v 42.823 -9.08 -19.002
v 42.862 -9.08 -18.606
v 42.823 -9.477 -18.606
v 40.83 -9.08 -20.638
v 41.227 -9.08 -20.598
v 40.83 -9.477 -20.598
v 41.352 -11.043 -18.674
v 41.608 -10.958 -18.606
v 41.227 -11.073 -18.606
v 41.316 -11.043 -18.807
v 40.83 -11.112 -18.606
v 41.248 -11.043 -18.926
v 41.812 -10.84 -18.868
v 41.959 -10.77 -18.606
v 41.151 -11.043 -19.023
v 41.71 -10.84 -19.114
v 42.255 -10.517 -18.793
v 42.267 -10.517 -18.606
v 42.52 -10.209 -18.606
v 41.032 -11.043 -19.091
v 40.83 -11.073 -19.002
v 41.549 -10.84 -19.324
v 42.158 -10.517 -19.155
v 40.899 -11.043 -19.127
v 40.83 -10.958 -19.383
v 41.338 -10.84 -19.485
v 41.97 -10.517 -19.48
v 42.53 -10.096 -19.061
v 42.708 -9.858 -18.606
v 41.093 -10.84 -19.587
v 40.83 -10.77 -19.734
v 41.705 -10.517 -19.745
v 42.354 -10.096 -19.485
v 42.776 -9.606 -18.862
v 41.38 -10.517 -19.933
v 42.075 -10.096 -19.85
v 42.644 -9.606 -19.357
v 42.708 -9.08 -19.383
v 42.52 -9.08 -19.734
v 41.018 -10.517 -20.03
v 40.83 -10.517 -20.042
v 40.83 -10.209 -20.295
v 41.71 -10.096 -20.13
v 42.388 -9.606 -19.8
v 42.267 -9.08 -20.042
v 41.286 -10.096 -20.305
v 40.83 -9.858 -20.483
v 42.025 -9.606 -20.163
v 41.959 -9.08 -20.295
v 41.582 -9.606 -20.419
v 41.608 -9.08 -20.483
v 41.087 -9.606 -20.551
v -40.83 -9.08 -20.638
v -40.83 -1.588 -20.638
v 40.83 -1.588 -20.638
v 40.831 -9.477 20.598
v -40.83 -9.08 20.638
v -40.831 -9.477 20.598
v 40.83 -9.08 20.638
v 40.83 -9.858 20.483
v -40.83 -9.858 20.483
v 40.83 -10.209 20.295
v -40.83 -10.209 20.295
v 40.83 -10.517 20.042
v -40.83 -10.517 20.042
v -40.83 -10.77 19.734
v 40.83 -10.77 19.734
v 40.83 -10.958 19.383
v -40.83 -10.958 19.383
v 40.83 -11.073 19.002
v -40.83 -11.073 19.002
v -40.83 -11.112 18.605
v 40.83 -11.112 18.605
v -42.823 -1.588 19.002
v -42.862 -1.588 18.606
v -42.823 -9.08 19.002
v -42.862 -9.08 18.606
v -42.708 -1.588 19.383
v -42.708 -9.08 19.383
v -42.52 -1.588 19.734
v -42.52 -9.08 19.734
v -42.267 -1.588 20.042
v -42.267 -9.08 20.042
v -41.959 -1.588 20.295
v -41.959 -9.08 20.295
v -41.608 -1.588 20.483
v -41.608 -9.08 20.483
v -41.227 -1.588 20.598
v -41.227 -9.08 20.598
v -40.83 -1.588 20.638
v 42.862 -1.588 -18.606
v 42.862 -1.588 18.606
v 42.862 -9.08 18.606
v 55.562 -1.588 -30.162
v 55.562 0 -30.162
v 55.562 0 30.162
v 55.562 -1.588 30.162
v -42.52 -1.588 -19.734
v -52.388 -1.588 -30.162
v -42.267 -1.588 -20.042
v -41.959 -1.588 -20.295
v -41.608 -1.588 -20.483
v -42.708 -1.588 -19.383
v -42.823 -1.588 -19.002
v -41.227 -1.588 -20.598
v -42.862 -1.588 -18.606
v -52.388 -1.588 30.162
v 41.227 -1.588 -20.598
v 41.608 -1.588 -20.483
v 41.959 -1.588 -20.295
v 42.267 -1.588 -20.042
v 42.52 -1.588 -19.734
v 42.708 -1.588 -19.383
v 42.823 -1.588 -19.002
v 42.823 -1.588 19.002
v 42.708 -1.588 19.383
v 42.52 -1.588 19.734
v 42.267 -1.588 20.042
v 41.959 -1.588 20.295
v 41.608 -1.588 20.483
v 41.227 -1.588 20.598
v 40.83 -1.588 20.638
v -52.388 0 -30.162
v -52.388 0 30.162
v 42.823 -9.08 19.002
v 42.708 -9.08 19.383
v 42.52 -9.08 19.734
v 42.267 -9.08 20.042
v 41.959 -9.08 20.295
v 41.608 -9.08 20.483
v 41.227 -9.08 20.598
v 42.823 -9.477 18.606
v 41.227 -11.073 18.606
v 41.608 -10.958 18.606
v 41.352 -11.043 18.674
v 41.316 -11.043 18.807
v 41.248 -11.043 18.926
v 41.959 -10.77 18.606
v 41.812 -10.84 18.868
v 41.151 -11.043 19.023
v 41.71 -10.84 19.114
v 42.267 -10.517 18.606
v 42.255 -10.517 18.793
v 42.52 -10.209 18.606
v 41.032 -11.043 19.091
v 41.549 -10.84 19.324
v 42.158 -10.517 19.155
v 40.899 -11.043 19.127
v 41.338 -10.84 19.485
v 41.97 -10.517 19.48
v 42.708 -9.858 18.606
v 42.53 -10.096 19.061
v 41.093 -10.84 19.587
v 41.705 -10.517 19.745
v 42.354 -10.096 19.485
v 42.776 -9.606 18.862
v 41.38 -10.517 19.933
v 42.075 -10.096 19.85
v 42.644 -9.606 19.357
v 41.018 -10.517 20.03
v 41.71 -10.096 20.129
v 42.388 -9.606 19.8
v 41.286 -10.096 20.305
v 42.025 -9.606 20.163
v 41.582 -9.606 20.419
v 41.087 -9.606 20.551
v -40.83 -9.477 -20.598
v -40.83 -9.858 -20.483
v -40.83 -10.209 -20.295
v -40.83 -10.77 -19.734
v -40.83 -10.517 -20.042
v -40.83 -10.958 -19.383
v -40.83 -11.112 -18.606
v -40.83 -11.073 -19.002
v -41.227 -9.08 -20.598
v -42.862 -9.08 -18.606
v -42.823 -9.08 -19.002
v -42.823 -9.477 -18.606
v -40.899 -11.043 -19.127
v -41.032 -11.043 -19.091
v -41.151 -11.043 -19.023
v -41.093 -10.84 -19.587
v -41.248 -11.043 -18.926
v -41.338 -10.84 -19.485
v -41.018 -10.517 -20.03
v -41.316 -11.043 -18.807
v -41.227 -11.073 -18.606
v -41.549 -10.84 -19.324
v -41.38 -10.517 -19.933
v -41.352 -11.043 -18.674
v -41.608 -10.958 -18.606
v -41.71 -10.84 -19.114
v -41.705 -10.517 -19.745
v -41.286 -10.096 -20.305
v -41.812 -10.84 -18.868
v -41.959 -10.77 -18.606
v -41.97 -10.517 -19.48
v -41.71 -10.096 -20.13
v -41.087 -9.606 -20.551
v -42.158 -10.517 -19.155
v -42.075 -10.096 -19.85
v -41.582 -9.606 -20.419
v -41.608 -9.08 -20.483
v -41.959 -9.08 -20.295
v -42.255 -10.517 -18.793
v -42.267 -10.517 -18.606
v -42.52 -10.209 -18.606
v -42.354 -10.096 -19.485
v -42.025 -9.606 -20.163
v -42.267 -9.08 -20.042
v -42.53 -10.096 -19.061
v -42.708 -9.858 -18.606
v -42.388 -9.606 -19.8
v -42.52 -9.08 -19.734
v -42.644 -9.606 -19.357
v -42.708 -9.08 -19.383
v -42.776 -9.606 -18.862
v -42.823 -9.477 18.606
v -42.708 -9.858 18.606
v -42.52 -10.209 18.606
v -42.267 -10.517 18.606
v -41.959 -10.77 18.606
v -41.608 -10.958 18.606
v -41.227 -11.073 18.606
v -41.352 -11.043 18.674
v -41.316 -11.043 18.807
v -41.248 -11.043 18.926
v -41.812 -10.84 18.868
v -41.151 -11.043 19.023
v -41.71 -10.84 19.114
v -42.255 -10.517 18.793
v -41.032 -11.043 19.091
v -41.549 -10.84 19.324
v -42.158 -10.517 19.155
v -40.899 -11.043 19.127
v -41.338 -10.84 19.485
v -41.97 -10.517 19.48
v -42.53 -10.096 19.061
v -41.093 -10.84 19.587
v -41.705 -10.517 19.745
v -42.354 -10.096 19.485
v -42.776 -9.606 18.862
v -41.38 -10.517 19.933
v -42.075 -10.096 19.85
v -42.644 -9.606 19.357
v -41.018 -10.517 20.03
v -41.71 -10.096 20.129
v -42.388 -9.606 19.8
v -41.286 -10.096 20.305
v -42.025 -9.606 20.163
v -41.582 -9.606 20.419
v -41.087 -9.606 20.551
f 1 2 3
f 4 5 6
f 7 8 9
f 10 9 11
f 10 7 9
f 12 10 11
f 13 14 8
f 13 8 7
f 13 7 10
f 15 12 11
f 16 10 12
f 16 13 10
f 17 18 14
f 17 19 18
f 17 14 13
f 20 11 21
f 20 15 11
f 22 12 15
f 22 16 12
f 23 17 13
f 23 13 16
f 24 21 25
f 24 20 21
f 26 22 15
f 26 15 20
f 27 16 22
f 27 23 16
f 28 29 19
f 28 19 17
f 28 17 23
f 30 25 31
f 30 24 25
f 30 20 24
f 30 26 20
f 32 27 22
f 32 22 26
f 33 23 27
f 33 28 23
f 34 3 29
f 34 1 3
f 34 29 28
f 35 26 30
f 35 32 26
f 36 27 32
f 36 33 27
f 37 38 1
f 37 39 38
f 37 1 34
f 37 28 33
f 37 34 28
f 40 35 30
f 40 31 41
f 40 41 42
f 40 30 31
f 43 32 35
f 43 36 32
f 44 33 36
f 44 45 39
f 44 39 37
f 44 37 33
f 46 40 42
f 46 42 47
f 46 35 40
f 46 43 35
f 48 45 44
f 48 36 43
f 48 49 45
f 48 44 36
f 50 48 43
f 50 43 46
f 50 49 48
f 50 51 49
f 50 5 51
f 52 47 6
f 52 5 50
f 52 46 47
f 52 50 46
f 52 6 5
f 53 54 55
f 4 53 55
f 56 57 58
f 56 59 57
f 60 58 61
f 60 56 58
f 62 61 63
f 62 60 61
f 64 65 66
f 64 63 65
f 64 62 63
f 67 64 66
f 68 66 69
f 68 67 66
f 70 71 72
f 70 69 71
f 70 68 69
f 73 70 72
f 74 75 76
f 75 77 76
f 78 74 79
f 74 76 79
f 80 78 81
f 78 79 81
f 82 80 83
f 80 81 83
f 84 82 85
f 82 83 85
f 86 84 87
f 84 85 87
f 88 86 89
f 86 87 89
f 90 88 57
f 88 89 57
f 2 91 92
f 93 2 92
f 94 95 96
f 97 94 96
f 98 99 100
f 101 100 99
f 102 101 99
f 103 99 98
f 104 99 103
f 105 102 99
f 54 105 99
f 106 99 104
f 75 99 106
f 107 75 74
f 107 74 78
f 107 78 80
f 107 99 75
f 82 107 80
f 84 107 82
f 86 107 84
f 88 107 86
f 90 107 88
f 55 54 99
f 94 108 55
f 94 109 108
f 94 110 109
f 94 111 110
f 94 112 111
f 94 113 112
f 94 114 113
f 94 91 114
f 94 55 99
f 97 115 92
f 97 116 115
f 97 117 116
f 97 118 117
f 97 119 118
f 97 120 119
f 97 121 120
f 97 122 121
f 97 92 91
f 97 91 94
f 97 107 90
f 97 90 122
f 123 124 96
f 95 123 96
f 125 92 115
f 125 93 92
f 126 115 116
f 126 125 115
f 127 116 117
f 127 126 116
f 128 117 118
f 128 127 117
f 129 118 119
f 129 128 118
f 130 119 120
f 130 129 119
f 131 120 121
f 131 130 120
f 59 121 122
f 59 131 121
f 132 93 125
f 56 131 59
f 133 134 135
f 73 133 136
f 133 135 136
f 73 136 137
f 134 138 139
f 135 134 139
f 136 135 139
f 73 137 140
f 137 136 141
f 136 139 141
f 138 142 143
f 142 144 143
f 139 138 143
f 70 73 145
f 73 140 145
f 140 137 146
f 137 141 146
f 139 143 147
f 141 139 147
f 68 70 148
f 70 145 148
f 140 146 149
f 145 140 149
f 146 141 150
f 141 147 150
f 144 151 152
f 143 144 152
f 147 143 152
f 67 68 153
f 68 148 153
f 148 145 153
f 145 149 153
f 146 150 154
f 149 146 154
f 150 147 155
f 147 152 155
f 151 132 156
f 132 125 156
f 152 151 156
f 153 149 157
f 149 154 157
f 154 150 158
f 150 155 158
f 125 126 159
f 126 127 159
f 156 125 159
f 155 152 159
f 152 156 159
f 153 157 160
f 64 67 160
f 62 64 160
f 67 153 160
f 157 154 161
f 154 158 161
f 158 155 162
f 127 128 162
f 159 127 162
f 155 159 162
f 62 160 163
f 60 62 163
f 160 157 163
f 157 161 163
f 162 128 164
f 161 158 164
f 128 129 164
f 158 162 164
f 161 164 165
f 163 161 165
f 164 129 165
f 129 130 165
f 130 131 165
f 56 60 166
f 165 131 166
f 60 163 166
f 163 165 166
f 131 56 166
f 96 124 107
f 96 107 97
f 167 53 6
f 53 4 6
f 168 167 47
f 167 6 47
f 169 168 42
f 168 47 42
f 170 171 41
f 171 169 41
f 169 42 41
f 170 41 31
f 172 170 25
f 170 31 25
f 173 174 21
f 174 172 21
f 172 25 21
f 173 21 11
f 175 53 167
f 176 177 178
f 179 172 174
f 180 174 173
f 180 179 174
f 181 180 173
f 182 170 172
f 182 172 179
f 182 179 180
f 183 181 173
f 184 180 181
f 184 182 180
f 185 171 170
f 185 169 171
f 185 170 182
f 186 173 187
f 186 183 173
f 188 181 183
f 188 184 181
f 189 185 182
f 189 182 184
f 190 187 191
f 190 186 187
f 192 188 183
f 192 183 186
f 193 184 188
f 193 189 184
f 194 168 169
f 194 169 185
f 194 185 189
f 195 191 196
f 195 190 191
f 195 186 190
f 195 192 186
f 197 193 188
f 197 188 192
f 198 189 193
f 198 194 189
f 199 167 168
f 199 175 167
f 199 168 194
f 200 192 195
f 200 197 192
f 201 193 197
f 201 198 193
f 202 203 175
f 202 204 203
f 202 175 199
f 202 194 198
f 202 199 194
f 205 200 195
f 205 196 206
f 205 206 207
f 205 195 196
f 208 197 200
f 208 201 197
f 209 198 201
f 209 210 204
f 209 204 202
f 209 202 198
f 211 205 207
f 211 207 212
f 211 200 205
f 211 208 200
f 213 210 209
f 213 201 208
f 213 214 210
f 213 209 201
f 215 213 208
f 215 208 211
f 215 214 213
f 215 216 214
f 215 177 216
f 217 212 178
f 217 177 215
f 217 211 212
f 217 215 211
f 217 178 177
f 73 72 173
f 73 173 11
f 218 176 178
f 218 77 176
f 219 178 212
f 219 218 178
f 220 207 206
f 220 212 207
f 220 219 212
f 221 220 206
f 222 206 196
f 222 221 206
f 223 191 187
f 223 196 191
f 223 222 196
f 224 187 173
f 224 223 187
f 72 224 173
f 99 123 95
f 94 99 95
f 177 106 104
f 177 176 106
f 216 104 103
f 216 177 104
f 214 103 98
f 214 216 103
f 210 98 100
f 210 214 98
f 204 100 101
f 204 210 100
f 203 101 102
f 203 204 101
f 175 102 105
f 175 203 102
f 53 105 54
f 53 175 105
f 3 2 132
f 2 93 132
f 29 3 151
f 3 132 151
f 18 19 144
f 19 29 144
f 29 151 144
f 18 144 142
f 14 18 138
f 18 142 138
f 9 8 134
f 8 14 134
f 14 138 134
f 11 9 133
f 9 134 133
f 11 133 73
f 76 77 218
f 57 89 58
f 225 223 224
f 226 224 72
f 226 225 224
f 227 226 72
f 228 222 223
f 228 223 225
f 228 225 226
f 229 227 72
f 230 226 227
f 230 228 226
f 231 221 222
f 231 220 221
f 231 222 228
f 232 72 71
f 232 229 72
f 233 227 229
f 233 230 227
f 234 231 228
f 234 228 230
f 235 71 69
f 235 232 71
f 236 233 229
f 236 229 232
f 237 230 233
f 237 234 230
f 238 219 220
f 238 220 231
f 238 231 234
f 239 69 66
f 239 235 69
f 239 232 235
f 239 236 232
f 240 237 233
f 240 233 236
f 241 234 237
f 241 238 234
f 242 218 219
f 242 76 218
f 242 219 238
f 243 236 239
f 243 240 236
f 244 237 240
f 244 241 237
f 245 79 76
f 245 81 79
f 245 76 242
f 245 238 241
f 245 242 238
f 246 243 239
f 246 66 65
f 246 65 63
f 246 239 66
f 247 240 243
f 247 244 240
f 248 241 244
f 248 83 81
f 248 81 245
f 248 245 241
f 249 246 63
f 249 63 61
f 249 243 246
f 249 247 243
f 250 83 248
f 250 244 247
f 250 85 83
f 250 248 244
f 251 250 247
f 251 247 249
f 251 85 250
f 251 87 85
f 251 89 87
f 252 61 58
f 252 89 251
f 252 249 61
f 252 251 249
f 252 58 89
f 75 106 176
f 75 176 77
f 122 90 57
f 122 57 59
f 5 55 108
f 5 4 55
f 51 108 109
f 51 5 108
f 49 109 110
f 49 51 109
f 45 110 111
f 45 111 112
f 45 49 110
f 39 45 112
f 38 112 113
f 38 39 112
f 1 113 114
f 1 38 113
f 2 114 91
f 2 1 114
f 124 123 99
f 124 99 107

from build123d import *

# Parameters (mm, degrees)
F0_W     = 107.95
F0_H     = 60.325
F0_W_2   = 85.725
F0_H_2   = 41.275
F1_DEPTH = 1.5875
F2_DEPTH = 11.1125
F3_R     = 2.032


with BuildPart() as f1:
    # F0 (on Front) → F1 (new body)
    with BuildSketch(Plane.XZ):
        with Locations((1.5875, 0)):
            Rectangle(F0_W, F0_H)
        Rectangle(F0_W_2, F0_H_2, mode=Mode.SUBTRACT)
        Rectangle(F0_W_2, F0_H_2)
    extrude(amount=F1_DEPTH)

    # F0 (on Front) → F2 (join)
    with BuildSketch(Plane.XZ):
        Rectangle(F0_W_2, F0_H_2)
    extrude(amount=F2_DEPTH)

    # F3
    f3_edges = [f1.edges().sort_by_distance(p)[0] for p in [
        (42.8625, -6.35, 20.6375),
        (-42.8625, -6.35, 20.6375),
        (-42.8625, -6.35, -20.6375),
        (42.8625, -6.35, -20.6375),
        (42.8625, -11.1125, 0),
        (0, -11.1125, -20.6375),
        (-42.8625, -11.1125, 0),
        (0, -11.1125, 20.6375),
    ]]
    fillet(f3_edges, radius=F3_R)


solid = f1.part
